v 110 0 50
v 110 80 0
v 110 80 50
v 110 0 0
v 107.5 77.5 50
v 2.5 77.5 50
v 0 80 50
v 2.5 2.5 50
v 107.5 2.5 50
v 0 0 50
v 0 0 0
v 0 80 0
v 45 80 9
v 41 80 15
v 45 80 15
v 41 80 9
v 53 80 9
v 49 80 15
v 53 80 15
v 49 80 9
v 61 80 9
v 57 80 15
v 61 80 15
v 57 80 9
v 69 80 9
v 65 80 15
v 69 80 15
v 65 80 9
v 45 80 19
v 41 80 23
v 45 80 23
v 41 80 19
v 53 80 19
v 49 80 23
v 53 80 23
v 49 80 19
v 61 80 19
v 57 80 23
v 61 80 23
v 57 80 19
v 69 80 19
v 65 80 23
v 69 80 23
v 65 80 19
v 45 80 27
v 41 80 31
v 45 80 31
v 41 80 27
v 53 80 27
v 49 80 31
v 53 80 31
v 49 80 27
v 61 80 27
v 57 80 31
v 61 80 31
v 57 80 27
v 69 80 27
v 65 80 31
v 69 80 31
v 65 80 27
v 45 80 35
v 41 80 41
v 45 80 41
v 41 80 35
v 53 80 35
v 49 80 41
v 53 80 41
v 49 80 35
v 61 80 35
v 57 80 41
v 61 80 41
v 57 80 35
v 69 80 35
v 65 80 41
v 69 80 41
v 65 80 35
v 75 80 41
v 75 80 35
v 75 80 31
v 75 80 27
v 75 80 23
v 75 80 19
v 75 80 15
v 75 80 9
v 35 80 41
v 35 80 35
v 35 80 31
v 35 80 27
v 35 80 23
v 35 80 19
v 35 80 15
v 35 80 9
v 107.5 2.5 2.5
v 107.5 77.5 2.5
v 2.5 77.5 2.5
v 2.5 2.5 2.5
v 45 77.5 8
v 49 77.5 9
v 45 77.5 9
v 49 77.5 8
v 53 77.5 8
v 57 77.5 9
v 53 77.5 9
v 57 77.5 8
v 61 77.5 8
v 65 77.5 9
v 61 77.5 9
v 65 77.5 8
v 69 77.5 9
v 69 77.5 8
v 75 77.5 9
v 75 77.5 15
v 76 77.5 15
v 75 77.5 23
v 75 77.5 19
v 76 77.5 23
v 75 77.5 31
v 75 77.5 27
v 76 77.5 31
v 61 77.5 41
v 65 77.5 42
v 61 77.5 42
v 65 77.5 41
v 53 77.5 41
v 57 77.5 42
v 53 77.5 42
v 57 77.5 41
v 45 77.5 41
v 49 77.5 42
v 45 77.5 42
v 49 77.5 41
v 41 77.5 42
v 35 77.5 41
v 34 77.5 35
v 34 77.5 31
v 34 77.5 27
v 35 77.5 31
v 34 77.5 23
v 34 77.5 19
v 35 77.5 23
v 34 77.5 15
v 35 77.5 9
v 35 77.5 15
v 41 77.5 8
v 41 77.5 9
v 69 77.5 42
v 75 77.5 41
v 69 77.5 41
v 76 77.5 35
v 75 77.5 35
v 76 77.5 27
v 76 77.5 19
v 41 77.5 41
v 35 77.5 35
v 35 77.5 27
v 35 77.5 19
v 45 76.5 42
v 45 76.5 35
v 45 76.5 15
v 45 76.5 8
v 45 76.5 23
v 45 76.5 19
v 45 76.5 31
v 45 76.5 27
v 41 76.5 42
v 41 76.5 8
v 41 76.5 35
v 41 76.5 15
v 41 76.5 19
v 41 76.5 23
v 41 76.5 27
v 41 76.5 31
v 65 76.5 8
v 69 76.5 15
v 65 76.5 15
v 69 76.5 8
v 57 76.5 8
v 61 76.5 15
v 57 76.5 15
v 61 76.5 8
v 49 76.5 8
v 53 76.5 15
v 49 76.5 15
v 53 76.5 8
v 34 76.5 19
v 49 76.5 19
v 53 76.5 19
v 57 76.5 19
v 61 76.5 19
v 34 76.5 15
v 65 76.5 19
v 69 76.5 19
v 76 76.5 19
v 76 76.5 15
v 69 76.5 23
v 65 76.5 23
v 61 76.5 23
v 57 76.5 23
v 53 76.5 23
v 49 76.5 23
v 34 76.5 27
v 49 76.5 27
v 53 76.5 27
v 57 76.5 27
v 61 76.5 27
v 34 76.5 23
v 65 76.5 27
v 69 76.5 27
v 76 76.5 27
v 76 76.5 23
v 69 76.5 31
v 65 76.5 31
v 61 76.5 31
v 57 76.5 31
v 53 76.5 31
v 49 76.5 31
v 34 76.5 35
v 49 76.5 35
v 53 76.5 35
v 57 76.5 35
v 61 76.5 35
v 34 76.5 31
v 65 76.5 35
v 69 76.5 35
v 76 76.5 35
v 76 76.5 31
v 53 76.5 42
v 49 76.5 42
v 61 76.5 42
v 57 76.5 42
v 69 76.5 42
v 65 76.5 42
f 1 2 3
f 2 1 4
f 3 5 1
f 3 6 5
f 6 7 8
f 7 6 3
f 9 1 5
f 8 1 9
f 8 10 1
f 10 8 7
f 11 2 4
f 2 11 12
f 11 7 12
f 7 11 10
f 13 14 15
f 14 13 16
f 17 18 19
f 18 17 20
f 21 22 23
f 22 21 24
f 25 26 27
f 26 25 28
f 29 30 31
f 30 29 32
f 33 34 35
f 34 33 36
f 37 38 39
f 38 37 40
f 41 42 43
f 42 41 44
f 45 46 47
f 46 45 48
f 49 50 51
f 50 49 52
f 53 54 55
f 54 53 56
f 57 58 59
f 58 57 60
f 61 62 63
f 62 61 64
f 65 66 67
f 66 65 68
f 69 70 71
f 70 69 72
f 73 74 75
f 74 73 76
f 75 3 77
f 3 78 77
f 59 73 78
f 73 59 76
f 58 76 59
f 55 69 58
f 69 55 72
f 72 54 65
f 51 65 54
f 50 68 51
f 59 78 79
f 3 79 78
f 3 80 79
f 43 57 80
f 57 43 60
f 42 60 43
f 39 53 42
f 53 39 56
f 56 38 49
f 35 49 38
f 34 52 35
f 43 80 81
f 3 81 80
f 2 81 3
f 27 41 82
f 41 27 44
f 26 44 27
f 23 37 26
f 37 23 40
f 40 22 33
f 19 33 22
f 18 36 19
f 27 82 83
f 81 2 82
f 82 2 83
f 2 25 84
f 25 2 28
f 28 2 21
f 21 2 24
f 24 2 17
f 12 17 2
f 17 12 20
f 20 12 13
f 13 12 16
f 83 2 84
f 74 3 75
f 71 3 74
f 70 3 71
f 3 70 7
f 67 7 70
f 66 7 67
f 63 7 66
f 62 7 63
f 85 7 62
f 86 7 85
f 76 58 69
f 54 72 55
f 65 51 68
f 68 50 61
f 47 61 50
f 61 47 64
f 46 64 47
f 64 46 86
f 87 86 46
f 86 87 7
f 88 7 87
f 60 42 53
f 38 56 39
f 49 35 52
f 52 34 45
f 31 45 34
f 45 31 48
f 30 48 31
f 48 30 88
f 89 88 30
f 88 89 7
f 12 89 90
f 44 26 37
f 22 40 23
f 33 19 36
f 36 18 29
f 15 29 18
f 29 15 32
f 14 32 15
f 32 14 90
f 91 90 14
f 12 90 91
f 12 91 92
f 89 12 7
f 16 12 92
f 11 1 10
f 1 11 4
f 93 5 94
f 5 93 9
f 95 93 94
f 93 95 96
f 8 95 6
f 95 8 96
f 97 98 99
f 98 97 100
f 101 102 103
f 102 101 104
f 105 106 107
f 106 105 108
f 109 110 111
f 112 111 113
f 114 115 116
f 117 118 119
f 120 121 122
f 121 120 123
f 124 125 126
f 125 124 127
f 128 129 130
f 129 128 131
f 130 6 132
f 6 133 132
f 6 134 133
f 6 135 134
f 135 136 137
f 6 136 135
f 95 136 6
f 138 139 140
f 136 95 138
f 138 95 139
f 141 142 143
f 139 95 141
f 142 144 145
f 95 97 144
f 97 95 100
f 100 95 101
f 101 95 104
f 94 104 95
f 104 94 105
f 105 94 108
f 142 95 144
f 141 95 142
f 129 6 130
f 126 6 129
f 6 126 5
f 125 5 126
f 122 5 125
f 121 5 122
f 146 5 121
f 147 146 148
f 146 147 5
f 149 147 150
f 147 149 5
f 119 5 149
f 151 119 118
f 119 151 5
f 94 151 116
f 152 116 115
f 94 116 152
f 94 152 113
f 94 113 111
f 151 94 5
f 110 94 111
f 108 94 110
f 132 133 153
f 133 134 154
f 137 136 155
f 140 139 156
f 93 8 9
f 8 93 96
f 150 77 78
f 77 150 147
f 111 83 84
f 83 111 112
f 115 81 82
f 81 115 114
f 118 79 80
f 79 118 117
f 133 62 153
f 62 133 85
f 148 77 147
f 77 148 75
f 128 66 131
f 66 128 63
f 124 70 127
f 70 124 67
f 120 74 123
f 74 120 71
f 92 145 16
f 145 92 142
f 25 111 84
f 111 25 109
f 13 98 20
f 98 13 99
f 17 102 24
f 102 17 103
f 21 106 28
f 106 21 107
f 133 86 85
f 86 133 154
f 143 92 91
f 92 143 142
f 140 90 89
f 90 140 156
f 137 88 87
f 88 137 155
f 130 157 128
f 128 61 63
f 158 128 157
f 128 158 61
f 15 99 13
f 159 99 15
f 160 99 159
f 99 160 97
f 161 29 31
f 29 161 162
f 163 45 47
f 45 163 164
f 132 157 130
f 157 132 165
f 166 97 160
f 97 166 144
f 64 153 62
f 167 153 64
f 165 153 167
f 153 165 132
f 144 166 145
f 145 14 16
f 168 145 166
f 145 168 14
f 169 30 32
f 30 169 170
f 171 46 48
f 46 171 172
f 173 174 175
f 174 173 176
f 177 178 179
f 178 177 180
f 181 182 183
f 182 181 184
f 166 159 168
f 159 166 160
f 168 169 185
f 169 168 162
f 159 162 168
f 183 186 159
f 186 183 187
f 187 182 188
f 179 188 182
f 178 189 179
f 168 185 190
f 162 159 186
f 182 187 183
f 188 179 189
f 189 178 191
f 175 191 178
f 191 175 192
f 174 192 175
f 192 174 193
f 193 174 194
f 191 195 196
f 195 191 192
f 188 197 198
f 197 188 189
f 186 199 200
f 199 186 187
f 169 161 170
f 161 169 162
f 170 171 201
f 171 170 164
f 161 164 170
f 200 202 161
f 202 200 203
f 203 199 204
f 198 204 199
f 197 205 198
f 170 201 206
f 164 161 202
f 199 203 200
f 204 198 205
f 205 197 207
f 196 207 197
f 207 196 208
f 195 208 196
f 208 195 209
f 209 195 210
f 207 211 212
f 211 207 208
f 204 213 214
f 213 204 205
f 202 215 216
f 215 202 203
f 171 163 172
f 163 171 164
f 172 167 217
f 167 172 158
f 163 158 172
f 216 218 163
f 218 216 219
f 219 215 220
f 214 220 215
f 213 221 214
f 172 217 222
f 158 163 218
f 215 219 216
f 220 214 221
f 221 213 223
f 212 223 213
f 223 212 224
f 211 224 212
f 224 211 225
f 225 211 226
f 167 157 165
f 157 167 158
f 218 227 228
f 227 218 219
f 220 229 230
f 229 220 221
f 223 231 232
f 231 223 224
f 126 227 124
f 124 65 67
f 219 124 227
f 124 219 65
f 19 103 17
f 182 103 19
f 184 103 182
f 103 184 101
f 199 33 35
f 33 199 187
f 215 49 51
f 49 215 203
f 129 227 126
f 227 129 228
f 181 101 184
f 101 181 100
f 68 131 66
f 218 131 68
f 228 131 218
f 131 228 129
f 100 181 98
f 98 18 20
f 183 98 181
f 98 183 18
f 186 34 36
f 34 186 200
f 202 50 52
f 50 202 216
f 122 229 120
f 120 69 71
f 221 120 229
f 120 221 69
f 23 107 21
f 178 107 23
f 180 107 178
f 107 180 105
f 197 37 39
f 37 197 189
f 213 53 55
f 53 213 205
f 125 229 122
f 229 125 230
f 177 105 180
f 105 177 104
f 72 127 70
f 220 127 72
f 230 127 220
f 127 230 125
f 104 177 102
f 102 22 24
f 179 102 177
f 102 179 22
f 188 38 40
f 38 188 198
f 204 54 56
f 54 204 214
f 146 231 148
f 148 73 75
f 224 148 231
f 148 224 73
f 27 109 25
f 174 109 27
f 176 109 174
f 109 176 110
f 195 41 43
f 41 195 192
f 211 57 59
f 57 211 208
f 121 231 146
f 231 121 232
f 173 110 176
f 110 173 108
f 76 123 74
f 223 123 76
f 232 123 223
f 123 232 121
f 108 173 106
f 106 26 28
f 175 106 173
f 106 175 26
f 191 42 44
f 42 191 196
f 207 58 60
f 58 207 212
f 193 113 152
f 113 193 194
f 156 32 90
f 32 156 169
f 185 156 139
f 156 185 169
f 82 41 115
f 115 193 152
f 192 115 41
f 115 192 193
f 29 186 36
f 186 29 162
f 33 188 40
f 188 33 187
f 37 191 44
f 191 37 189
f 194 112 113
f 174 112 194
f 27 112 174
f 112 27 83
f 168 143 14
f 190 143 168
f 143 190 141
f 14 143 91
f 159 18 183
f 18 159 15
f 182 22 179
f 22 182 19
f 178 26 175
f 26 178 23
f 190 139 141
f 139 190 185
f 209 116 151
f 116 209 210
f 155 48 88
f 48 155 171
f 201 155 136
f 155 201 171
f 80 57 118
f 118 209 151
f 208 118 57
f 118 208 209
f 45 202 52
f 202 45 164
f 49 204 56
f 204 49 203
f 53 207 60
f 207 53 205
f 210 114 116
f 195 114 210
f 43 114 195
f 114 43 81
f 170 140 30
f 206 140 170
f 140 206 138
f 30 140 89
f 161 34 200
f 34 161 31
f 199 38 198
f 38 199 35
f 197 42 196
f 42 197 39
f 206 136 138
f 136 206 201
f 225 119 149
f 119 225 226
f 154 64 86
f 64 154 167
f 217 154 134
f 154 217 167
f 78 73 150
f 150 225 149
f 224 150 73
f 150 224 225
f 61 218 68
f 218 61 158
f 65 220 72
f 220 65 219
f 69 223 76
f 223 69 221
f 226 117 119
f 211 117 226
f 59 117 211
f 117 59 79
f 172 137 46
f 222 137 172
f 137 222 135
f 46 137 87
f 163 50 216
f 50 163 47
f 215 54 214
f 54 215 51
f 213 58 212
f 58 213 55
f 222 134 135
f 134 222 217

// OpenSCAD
$fn = 32;

// ----------------------------------------------------------------------
// Vent box: crossgrid enclosure
// ----------------------------------------------------------------------

// --- parameters (mm) ---
box_l = 110;              // box length, X
box_w = 80;               // box width, Y
box_h = 50;               // box height, Z
wall_t = 2.5;             // shell wall thickness
win_l = 40;               // vent window width, X
win_h = 32;               // vent window height, Z
bar_w = 4;                // grid bar width
n_v = 4;                  // vertical bar count
n_h = 3;                  // horizontal bar count

win_z0 = (box_h - win_h) / 2;  // window lower edge Z
v_step = win_l / (n_v + 1);  // vertical bar step
h_step = win_h / (n_h + 1);  // horizontal bar step

difference() {
  union() {
    difference() {
      cube([box_l, box_w, box_h]);
  translate([wall_t, wall_t, wall_t])
    cube([box_l - 2 * wall_t, box_w - 2 * wall_t, box_h]);
  translate([(box_l - win_l) / 2, box_w - wall_t - 1, win_z0])
    cube([win_l, wall_t + 2, win_h]);
    }
    for (i = [1 : n_v])
      translate([(box_l - win_l) / 2 + i * v_step - bar_w / 2,
                 box_w - wall_t - 1, win_z0 - 1])
        cube([bar_w, wall_t + 1, win_h + 2]);
    for (i = [1 : n_h])
      translate([(box_l - win_l) / 2 - 1, box_w - wall_t - 1,
                 win_z0 + i * h_step - bar_w / 2])
        cube([win_l + 2, wall_t + 1, bar_w]);
  }
}
